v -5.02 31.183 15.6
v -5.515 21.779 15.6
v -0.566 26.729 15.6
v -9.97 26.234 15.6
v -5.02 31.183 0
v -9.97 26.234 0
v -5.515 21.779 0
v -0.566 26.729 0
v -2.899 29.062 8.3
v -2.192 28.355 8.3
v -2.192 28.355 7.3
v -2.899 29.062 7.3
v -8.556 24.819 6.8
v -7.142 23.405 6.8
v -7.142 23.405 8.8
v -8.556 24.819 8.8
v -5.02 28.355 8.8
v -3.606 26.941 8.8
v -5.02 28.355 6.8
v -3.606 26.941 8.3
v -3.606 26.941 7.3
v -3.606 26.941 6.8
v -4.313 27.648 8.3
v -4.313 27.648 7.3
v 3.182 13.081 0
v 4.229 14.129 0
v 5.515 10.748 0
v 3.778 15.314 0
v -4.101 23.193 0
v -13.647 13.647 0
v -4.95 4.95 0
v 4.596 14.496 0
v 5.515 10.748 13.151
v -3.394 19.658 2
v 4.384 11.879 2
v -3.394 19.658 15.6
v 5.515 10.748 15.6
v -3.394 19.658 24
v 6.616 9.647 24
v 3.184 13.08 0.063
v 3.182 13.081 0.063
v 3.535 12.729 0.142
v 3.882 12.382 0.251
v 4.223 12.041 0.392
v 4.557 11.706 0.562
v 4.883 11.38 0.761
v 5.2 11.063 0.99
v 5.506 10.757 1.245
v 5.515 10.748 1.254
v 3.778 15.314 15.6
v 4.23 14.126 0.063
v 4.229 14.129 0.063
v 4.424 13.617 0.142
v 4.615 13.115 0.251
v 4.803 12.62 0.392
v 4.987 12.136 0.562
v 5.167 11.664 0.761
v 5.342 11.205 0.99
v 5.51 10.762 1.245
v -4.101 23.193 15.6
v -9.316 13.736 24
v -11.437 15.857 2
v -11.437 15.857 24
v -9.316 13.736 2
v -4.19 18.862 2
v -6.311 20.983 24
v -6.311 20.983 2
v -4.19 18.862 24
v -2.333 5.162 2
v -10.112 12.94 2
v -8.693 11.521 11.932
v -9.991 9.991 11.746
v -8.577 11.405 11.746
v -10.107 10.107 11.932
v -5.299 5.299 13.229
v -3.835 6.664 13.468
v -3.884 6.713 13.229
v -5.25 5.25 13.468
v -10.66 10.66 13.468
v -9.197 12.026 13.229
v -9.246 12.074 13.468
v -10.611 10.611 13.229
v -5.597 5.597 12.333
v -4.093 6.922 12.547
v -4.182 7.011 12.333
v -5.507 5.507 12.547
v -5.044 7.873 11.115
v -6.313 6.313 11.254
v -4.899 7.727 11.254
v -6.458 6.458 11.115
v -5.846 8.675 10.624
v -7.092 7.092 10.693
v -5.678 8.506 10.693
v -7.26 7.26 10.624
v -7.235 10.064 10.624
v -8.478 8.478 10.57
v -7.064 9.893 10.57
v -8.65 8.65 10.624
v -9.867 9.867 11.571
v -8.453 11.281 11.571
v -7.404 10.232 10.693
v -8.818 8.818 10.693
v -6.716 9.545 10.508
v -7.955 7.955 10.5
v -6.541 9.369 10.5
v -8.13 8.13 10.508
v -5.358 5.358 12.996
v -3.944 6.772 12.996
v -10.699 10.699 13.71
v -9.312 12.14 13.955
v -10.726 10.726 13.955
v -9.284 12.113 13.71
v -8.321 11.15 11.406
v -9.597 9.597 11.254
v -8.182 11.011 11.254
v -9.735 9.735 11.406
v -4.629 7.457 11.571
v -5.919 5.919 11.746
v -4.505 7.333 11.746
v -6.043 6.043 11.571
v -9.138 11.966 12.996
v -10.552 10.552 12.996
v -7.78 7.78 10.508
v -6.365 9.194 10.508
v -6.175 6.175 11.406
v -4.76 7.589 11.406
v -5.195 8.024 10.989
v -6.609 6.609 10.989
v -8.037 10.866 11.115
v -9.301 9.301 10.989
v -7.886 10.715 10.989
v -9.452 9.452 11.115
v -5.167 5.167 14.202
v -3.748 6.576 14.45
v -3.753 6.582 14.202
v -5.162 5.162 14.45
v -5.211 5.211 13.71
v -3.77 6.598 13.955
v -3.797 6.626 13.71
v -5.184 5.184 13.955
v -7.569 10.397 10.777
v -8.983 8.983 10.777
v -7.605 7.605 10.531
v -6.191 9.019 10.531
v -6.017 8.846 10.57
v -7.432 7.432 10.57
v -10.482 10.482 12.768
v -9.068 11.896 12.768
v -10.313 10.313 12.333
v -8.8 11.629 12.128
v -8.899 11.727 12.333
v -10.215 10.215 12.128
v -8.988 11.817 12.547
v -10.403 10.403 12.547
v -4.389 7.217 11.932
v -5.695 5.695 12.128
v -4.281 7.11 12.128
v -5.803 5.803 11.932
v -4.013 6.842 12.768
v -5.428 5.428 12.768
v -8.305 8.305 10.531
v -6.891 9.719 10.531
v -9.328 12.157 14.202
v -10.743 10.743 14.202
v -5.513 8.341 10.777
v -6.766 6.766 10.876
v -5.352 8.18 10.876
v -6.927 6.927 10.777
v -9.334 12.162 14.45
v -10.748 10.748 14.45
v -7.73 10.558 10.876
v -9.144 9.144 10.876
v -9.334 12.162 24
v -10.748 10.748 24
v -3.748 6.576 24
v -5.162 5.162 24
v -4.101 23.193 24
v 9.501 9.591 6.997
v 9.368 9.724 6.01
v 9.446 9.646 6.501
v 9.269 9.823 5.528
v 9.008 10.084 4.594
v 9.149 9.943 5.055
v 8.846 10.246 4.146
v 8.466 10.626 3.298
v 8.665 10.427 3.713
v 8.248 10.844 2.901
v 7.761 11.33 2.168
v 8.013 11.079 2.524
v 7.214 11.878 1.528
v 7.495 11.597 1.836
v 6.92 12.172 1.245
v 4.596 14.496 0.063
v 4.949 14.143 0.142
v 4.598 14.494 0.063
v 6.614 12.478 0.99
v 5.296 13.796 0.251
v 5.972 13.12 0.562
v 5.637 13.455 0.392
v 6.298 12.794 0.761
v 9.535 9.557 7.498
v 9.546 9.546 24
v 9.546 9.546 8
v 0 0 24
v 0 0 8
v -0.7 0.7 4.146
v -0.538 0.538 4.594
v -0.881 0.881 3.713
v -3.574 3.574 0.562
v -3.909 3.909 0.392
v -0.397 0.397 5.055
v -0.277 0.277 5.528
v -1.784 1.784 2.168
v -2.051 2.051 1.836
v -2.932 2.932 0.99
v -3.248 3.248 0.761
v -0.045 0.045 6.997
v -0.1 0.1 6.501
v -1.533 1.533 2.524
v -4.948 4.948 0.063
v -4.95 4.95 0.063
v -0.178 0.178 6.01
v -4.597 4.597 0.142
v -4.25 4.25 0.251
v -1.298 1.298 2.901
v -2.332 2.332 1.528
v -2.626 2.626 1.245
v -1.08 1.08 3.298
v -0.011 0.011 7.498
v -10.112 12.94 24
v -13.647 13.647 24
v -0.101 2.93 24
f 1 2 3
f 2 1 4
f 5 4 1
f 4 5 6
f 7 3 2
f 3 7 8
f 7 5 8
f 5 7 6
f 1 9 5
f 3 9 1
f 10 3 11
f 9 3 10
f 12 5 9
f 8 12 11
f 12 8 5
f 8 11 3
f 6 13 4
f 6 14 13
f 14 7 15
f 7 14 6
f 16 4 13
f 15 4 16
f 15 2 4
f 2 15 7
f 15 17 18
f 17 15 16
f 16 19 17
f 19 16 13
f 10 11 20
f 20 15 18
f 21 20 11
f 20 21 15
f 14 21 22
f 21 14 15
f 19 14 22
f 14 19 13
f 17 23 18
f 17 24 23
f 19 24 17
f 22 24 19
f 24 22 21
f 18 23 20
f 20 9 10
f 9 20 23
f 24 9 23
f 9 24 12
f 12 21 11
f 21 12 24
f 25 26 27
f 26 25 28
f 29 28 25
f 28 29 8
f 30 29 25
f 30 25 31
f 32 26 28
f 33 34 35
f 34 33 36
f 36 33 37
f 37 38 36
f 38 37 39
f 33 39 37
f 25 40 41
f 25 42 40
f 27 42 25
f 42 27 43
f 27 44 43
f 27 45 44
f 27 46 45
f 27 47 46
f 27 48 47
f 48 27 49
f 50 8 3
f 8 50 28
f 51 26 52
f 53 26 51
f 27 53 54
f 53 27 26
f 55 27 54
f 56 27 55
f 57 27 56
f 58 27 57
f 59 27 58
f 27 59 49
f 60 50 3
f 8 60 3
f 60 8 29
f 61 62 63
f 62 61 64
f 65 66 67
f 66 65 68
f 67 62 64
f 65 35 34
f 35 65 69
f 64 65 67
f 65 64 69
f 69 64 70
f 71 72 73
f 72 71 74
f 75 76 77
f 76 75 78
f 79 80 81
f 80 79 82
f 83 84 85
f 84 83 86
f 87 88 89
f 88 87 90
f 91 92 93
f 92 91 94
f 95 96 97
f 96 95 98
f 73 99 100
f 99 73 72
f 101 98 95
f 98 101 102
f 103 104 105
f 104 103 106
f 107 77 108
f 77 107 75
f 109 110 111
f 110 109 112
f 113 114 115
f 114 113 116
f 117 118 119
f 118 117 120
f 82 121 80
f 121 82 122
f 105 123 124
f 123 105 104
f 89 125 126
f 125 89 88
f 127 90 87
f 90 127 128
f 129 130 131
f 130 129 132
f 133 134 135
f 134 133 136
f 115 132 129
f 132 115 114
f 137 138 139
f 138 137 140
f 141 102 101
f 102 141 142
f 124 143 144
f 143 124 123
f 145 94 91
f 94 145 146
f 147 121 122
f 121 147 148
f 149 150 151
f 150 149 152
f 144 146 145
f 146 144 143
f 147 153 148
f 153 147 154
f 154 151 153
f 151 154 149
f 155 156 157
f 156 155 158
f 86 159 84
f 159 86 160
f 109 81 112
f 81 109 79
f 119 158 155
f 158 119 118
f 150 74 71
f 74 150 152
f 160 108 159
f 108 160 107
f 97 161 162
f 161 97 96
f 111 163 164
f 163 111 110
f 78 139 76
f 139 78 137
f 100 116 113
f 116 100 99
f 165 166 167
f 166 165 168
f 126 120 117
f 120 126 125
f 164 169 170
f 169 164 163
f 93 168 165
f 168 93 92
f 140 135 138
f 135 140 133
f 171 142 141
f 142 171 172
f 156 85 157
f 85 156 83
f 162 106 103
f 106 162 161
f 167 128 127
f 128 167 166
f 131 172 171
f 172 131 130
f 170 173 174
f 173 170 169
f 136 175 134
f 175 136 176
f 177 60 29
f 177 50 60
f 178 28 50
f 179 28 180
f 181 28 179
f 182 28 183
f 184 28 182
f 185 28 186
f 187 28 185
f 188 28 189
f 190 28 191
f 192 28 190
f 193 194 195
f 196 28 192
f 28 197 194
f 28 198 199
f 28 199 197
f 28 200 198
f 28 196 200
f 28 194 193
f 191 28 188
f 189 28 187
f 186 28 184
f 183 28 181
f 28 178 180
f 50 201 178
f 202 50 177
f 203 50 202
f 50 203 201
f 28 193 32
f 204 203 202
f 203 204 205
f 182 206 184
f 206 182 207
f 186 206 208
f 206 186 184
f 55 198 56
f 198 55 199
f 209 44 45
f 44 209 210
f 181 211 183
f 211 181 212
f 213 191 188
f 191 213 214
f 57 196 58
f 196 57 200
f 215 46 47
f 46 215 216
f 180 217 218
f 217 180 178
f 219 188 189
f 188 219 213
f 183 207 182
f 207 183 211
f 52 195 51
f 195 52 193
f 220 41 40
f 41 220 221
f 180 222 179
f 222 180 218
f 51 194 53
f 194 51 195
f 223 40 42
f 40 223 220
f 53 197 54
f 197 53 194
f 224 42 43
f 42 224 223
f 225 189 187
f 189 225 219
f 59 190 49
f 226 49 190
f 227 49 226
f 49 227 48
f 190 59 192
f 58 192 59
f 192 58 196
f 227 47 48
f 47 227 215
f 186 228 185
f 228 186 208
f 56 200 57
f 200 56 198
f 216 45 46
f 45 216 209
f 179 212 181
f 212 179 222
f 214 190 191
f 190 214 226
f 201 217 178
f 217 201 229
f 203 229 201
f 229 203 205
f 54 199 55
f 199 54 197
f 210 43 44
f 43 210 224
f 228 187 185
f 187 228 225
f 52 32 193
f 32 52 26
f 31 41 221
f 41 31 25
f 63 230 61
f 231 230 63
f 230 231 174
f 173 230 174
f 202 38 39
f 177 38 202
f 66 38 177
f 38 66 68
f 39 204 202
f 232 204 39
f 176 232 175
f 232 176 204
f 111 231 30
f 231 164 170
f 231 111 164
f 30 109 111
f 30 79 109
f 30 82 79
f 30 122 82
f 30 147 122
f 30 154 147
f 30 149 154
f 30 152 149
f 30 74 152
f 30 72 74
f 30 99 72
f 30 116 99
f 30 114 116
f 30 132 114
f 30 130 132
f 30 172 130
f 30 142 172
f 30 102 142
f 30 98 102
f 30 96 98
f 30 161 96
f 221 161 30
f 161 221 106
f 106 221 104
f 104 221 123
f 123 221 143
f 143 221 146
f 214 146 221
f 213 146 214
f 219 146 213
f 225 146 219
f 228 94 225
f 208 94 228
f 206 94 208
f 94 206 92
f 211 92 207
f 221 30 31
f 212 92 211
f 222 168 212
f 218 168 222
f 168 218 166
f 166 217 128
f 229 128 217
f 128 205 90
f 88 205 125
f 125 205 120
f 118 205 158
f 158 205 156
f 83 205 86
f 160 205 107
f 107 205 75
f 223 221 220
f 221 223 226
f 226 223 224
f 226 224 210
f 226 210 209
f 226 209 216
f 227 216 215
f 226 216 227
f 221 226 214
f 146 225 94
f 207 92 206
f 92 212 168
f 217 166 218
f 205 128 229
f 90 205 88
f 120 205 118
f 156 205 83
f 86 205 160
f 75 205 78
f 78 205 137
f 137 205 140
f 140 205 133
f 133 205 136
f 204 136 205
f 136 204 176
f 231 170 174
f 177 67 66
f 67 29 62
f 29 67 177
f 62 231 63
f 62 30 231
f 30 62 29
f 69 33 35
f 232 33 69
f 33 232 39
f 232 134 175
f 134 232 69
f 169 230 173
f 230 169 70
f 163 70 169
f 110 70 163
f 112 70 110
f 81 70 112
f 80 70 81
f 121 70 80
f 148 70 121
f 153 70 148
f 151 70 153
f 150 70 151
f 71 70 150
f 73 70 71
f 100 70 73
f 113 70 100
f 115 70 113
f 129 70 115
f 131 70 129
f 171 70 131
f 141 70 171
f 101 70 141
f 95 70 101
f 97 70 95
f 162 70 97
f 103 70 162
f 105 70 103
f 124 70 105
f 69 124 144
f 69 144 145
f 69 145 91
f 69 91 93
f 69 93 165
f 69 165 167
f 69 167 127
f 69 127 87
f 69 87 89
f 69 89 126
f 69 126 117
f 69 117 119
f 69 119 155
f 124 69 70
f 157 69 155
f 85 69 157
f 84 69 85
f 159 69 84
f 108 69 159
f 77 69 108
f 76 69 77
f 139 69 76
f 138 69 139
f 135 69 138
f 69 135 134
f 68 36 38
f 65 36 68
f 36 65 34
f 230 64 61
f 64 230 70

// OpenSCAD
$fn=100;

CRIMPER = "SN28B"; // Either "SN58B" or "SN28B"
assert(CRIMPER == "SN58B" || CRIMPER == "SN28B",
    "CRIMPER set to improper value");
TYPE = "DUPONT";
assert(TYPE == "DUPONT" || TYPE == "JST_XH_2_54" || TYPE == "JST_SM_2_5",
    "TYPE set to improper value");

// For IWISS SN-58B

lip_len = CRIMPER == "SN28B"? 22 : 24.25;
lip_h = 3; // Without teeth
lip_overhang = 2.3;
lip_w = 7.25;
front_to_first = CRIMPER == "SN28B"? 5.8 : 3.7;
h_first = 2.30;
max_jaw_h = 14.3;
min_jaw_h = 11.0;
jaw_w = 9.5;

screw_d = 7.9;
screw_h = 2;
front_to_screw =  CRIMPER == "SN28B"? 8.5 : 10.5;
screw_to_lip = 1.1;

thk = screw_h; // Thickness of outer walls.

holder_h = lip_h+max_jaw_h+thk;
holder_w = jaw_w + 2*thk;
holder_len = lip_len+thk;

module bevel_on_y(x, y) {
    translate([0, 0, -x])
        rotate([90, 0, 90])
            linear_extrude(x) {
                polygon(points=[[0,0], [0, x], [y, x]]);
            }
}

module dupont() {
    hole_sz = 2;
    pin_sz = 1;
    hole_depth = 5;
    z = hole_sz+thk+h_first;
    x = 2*thk+front_to_first*2;
    y = hole_depth+thk;
    translate([0, holder_w-thk, holder_h]) {
        difference() {
            cube([x, y, z]);
            translate([front_to_first+thk-hole_sz/2, -1, h_first])
                cube([hole_sz, hole_depth+1, hole_sz]);
            translate([front_to_first+thk-pin_sz/2, -1, h_first])
                cube([pin_sz, hole_depth*4+1, pin_sz]);
        }
        bevel_on_y(x, y);
    }    
}

module jst_sm_2_5() {
    hole_h = 3.5;
    hole_w = 2.1;
    hole_depth = 2;
    pin_h = 1.2;
    pin_w = 2;
    z = hole_h+thk+h_first;
    x = 2*thk+front_to_first*2;
    y = hole_depth+thk;
    translate([0, holder_w-thk, holder_h]) {
        difference() {
            cube([x, y, z]);
            translate([front_to_first+thk-hole_w/2, -1, h_first])
                cube([hole_w, hole_depth+1, hole_h]);
            translate([front_to_first+thk-pin_w/2, -1, h_first])
                cube([pin_w, hole_depth*4+1, pin_h]);
        }
        bevel_on_y(x, y);
    }    
}

module jst_xh_2_54() {
    hole_h = 3;
    hole_w = 2;
    hole_depth = 2;
    z = hole_h+thk+h_first;
    x = 2*thk+front_to_first*2;
    y = hole_depth+thk;
    translate([0, holder_w-thk, holder_h]) {
        difference() {
            cube([x, y, z]);
            translate([front_to_first+thk-hole_w/2, -1, h_first])
                cube([hole_w, hole_depth+1, hole_h]);
        }
        bevel_on_y(x, y);
    }    
}

module lip() {
    cube([lip_len+1, lip_h+1, lip_w]);
    translate([0, -min_jaw_h, 0])
        cube([lip_overhang+lip_len+1, min_jaw_h, lip_w]);
}

module jaw() {
    linear_extrude(jaw_w) {
        h = max_jaw_h;
        min_bot = h-min_jaw_h;
        l = lip_len+1;
        polygon(points=[[0, min_bot], [0, h], [l, h],
            [l, 0]]);
    }
}

module screw_slot() {
    r = screw_d/2;
    translate([r, r, -1])
        cylinder(r=r, h=screw_h+2);
    translate([r, 0, -1])
        cube([lip_len, r*2, screw_h+2]);
}

module round_corner_untrimed(r) {
    translate([0, 0, (holder_w+2)/2]) {
        difference() {
            cube([r*2, r*2, holder_w+2], center=true);
            translate([0, 0, -(holder_w+4)/2])
                cylinder(r=r, h=holder_w+4);
        }
    }
}

module round_corner() {
    r = 8;
    translate([r, r, 0])
    difference() {
        round_corner_untrimed(r);
        translate([-r, -1, -1])
            cube([r*2+2, r+2, holder_w+4]);
        translate([0, -r-1, -1])
            cube([r+2, r+1, holder_w+4]);
    }
}


module holder() {
    translate([0, holder_w, 0]) rotate([90, 0, 0]) difference() {
        cube([holder_len, holder_h, holder_w]);
        translate([thk, holder_h-lip_h, (holder_w-lip_w)/2]) lip();
        translate([thk, thk, (holder_w-jaw_w)/2]) jaw();
        translate([front_to_screw+thk,
            holder_h-lip_h-screw_to_lip-screw_d, holder_w-thk])
            screw_slot();
        round_corner();
    }
}

rotate([0, -90, -45]) {
    if (TYPE == "DUPONT") {
        dupont();
    } else if (TYPE == "JST_XH_2_54") {
        jst_xh_2_54();
    } else { // TYPE == JST_SM_2_5
        jst_sm_2_5();
    }
    holder();
}
